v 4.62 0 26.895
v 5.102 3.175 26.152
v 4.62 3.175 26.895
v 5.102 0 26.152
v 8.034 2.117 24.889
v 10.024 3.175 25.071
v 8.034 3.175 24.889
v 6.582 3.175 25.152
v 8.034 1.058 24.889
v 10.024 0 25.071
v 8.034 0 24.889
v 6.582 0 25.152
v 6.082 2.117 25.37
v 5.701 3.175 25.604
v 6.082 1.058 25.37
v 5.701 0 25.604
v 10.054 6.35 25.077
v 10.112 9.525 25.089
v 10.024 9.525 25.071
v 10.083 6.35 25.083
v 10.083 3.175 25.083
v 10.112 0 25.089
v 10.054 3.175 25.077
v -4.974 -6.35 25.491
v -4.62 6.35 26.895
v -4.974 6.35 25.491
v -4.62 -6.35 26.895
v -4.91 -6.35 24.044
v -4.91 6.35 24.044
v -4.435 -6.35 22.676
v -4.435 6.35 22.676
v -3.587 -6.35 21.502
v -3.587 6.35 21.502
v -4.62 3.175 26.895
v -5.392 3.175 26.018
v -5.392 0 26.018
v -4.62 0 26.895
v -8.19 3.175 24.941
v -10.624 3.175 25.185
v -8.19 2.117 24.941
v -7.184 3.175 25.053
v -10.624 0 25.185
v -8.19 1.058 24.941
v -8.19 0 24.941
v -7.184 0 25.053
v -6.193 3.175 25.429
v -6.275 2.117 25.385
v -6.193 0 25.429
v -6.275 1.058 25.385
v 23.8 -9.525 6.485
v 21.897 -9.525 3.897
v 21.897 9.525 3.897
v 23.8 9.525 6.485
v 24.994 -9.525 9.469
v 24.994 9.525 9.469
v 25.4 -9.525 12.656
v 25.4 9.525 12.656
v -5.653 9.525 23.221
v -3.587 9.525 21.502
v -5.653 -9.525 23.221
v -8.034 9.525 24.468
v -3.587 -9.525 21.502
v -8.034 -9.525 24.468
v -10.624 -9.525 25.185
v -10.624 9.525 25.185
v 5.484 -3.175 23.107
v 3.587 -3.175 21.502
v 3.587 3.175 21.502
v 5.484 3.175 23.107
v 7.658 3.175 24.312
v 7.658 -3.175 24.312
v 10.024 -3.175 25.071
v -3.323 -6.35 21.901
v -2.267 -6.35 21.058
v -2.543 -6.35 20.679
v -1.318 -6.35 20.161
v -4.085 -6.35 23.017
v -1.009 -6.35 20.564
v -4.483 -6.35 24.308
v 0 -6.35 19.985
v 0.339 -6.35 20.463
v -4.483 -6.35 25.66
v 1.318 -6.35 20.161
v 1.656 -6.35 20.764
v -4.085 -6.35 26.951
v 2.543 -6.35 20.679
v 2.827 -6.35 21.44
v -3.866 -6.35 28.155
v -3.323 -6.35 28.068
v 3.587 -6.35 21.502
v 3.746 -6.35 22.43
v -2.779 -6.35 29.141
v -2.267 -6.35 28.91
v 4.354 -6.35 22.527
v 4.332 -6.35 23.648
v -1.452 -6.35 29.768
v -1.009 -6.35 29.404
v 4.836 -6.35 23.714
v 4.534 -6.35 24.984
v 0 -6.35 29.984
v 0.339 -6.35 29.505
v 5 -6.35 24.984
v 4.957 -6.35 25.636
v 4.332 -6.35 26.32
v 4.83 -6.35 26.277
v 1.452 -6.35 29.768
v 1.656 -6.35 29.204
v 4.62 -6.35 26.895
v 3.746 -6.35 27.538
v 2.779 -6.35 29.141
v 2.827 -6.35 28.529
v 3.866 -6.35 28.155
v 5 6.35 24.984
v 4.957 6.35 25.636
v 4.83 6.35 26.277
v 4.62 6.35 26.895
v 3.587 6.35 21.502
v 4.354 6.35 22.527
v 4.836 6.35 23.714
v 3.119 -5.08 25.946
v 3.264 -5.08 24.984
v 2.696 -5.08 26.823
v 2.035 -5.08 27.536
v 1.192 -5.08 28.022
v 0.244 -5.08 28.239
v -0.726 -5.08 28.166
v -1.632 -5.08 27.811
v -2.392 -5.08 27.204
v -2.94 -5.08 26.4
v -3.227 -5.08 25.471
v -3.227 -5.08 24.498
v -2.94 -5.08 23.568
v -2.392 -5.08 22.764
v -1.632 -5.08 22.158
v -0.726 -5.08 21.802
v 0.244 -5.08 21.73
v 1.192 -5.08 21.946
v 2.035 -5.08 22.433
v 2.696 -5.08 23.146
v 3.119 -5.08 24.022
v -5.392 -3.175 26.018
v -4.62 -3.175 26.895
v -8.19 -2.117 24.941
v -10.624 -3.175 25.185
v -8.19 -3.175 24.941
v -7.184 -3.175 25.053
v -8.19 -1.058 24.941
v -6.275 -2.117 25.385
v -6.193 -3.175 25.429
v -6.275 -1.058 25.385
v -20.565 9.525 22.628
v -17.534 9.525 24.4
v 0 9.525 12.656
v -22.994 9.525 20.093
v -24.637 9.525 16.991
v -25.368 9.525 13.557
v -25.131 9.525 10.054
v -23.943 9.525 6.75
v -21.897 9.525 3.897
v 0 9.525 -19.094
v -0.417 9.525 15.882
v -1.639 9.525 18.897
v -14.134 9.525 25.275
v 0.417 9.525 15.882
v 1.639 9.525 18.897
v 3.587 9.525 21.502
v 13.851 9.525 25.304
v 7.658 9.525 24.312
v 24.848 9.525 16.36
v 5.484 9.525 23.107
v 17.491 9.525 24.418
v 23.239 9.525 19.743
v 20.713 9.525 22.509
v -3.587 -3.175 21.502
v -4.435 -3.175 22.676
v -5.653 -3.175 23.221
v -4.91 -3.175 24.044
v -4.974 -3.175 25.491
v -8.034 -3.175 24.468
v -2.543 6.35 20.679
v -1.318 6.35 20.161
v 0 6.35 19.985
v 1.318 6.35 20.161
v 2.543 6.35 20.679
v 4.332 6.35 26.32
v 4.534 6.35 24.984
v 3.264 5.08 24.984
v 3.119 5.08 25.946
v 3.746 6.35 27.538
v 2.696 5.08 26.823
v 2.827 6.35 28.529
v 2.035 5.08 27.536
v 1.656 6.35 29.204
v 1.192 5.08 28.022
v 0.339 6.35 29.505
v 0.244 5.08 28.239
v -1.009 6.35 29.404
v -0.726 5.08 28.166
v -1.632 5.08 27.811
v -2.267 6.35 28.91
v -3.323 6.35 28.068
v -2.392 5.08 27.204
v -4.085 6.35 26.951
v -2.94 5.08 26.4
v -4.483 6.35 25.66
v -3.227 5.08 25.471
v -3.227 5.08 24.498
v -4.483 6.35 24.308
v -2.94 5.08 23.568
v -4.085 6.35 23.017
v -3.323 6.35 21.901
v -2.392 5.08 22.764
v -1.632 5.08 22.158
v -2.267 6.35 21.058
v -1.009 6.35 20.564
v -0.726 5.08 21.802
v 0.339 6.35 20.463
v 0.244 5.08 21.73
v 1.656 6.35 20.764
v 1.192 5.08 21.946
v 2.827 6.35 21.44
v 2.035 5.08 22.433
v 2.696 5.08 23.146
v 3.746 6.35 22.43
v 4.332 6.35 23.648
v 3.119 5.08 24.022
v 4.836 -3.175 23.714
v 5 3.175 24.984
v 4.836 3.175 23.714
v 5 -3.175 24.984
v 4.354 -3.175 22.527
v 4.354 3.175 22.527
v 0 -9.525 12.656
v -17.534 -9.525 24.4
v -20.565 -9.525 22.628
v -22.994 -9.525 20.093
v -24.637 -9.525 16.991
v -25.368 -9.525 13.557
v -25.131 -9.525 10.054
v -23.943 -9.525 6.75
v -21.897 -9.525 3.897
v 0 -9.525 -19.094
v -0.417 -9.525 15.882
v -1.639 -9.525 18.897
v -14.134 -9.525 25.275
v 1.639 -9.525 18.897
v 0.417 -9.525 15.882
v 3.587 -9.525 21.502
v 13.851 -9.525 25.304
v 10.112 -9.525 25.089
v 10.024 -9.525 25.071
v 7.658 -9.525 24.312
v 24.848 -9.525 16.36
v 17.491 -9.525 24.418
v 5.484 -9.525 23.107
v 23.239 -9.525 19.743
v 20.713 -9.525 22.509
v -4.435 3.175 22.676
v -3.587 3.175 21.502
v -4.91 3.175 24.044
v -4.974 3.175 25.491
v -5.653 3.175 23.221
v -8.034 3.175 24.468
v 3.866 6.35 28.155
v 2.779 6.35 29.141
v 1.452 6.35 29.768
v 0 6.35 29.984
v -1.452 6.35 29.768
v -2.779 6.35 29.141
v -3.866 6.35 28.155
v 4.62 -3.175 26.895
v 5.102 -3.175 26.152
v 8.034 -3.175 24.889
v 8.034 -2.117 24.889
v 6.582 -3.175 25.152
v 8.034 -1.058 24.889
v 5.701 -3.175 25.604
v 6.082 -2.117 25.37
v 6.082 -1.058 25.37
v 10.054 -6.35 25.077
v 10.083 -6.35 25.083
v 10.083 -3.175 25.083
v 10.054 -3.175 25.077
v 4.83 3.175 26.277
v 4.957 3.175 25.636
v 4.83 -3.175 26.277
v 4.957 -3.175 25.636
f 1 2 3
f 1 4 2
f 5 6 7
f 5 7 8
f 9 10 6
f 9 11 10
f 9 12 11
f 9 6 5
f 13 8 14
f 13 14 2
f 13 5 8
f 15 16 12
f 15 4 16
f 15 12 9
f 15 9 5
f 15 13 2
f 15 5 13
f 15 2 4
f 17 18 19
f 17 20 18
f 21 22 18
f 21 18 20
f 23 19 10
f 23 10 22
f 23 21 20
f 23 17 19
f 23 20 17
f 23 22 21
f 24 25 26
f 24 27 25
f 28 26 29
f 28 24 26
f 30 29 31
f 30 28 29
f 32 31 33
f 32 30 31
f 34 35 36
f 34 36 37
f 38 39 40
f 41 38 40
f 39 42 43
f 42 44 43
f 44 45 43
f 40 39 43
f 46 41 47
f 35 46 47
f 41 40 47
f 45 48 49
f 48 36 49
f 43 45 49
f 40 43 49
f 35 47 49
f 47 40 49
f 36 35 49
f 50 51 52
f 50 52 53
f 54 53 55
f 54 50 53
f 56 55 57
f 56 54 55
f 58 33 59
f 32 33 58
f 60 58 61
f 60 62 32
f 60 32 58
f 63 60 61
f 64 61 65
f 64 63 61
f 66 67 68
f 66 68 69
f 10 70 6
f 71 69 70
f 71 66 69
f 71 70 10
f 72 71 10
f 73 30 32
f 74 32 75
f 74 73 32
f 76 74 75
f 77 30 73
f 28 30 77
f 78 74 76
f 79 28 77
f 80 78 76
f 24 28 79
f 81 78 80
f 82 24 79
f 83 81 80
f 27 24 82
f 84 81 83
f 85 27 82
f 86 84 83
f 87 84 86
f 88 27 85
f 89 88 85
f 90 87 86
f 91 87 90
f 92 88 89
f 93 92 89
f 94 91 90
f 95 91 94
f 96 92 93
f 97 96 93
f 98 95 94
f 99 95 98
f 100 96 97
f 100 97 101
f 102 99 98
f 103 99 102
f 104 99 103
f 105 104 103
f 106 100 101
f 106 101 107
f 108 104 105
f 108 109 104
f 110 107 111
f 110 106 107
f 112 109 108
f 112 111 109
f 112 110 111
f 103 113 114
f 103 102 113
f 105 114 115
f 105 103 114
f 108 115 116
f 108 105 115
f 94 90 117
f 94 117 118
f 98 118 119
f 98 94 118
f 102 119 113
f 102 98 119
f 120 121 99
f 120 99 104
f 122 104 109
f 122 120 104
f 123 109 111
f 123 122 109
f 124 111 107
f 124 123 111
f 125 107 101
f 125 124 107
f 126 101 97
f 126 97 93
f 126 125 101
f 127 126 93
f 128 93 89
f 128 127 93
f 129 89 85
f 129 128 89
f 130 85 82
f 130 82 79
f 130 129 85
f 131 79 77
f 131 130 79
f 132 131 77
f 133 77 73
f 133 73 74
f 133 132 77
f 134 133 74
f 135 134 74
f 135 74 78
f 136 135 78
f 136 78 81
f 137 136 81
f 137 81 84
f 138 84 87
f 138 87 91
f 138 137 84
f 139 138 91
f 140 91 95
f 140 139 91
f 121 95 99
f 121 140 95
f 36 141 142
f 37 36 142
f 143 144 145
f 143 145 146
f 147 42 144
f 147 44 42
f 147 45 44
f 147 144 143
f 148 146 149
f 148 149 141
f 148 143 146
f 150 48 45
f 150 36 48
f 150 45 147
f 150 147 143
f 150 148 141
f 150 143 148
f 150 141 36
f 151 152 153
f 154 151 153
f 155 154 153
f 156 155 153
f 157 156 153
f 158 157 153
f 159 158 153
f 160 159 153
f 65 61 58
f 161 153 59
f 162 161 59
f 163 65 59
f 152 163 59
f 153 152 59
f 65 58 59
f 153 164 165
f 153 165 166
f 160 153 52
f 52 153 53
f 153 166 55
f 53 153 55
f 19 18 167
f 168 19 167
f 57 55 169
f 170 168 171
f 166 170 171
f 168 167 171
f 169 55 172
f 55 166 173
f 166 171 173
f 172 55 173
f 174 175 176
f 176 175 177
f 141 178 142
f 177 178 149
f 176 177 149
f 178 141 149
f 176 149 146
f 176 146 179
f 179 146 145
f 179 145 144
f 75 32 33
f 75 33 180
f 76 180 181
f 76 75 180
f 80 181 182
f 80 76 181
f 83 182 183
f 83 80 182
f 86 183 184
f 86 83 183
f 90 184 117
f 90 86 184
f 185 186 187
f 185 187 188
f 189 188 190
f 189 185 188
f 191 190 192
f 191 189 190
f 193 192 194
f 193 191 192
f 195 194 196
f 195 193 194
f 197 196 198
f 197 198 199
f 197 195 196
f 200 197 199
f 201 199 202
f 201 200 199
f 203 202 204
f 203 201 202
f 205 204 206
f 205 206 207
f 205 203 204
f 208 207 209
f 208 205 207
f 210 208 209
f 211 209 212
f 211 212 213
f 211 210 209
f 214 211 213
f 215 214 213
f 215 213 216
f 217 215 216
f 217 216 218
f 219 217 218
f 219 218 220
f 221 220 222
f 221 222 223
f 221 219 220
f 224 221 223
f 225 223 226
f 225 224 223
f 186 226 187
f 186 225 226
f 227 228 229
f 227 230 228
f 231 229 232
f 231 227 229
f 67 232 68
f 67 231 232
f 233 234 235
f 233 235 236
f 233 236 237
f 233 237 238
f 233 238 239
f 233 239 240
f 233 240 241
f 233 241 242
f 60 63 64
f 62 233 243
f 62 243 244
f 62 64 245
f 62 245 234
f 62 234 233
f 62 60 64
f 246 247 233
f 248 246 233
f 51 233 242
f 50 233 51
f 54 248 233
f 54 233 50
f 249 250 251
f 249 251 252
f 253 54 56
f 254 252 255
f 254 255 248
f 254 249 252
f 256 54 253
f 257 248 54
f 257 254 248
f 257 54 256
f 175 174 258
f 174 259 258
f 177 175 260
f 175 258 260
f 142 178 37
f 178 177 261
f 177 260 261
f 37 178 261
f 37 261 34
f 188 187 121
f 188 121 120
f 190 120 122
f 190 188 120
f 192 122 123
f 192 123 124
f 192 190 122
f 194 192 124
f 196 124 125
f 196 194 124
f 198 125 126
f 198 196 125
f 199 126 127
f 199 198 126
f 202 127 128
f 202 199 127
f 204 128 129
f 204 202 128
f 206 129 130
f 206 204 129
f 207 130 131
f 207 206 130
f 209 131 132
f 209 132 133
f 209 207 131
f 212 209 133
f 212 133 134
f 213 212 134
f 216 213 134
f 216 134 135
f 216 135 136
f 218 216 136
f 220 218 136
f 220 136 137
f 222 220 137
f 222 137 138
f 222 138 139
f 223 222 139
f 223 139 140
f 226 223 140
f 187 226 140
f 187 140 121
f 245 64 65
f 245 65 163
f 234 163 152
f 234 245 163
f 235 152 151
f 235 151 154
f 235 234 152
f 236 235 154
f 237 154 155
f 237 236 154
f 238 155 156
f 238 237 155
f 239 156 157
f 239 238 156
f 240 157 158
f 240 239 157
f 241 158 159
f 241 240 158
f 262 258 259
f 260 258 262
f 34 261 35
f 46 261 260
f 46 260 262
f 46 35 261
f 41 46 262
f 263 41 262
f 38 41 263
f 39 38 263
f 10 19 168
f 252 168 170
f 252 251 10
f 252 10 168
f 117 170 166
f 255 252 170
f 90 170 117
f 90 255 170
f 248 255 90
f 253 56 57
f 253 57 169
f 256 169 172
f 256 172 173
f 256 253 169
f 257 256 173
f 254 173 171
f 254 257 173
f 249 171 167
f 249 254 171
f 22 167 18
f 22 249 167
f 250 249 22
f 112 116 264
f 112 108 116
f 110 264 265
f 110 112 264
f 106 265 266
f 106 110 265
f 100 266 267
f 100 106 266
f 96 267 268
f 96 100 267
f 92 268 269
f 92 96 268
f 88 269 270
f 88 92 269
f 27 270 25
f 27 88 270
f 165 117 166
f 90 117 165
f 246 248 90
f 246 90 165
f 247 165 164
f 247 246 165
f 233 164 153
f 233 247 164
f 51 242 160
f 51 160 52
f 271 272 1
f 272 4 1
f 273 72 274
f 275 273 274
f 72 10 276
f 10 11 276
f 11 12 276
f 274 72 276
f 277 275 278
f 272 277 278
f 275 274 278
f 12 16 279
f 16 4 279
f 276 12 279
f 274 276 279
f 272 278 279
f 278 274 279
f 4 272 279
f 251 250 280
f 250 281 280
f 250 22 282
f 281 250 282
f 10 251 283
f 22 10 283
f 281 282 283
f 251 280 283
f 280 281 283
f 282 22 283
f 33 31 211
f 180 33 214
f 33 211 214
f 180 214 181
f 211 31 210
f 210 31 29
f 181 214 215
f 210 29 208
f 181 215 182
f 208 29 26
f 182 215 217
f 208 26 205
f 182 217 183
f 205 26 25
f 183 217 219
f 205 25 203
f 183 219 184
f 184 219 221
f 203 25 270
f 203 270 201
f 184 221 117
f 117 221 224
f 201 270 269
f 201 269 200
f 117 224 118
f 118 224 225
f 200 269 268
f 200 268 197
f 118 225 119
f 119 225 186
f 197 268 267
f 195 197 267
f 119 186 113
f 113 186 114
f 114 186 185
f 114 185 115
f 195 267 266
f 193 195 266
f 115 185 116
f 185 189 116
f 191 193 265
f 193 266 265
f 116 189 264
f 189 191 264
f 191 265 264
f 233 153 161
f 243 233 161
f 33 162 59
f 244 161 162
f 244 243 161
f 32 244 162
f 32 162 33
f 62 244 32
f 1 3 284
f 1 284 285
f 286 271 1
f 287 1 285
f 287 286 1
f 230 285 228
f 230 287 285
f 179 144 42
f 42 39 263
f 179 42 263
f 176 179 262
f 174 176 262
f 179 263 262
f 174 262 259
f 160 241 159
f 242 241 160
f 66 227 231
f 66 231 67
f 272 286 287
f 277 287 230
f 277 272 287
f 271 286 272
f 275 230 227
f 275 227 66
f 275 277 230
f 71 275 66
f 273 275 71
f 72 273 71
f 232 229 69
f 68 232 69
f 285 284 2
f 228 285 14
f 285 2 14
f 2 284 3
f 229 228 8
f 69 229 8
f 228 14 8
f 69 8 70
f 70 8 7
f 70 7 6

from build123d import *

# Parameters (mm, degrees)
F1_DEPTH = 9.525
F0_R     = 3.263573
F2_DEPTH = 6.35
F3_DEPTH = 3.175
F4_SIZE  = 1.27


with BuildPart() as f1:
    # F0 (on Front) → F1 (new body, symmetric)
    with BuildSketch(Plane.XZ):
        with BuildLine():
            ThreePointArc((3.587389, 21.501787), (0.930969, 17.428697), (0, 12.655866))
            ThreePointArc((0, 12.655866), (7.983338, 0.864212), (21.896552, 3.897245))
            ThreePointArc((21.896552, 3.897245), (24.491654, 7.939205), (25.4, 12.655866))
            ThreePointArc((25.4, 12.655866), (20.713209, 22.508707), (10.11205, 25.08939))
            add(Edge.make_bspline(
                [(10.11205, 25.08939), (10.082931, 25.083087), (10.053647, 25.076882), (10.024208, 25.070782)],
                knots=[0, 0, 0, 0, 0.090159, 0.090159, 0.090159, 0.090159], degree=3))
            ThreePointArc((10.024208, 25.070782), (6.541588, 23.762799), (3.587389, 21.501787))
        make_face()
        with BuildLine():
            ThreePointArc((-3.587389, 21.501787), (-6.810536, 23.90772), (-10.624388, 25.185105))
            ThreePointArc((-10.624388, 25.185105), (-23.923644, 18.598913), (-21.896552, 3.897245))
            ThreePointArc((-21.896552, 3.897245), (-7.983338, 0.864212), (0, 12.655866))
            ThreePointArc((0, 12.655866), (-0.930969, 17.428697), (-3.587389, 21.501787))
        make_face()
        with BuildLine():
            ThreePointArc((0, 12.655866), (-7.983338, 0.864212), (-21.896552, 3.897245))
            Line((-21.896552, 3.897245), (0, -19.094134))
            Line((0, -19.094134), (21.896552, 3.897245))
            ThreePointArc((21.896552, 3.897245), (7.983338, 0.864212), (0, 12.655866))
        make_face()
    extrude(amount=F1_DEPTH, both=True)

    # F0 (on Front) → F2 (join, symmetric)
    with BuildSketch(Plane.XZ):
        with BuildLine():
            ThreePointArc((-4.619993, 26.895242), (-4.91046, 24.044055), (-3.587389, 21.501787))
            ThreePointArc((-3.587389, 21.501787), (0, 19.98454), (3.587389, 21.501787))
            ThreePointArc((3.587389, 21.501787), (4.633149, 23.105252), (4.999646, 24.984187))
            ThreePointArc((4.999646, 24.984187), (4.903815, 25.958388), (4.619993, 26.895242))
            ThreePointArc((4.619993, 26.895242), (0, 29.983833), (-4.619993, 26.895242))
        make_face()
        with Locations((0, 24.984187)):
            Circle(F0_R, mode=Mode.SUBTRACT)
    extrude(amount=F2_DEPTH, both=True)

    # F4
    f4_edges = [f1.edges().sort_by_distance(p)[0] for p in [
        (-3.263573, -6.35, 24.984187),
        (-3.263573, 6.35, 24.984187),
    ]]
    chamfer(f4_edges, length=F4_SIZE)


with BuildPart() as f3:
    # F0 (on Front) → F3 (new body, symmetric)
    with BuildSketch(Plane.XZ):
        with BuildLine():
            add(Edge.make_bspline(
                [(-10.624388, 25.185105), (-7.844404, 24.724569), (-6.230196, 24.724569), (-4.619993, 26.895242)],
                knots=[0, 0, 0, 0, 6.243183, 6.243183, 6.243183, 6.243183], degree=3))
            ThreePointArc((-10.624388, 25.185105), (-6.810536, 23.90772), (-3.587389, 21.501787))
            ThreePointArc((-3.587389, 21.501787), (-4.91046, 24.044055), (-4.619993, 26.895242))
        make_face()
        with BuildLine():
            ThreePointArc((4.999646, 24.984187), (4.633149, 23.105252), (3.587389, 21.501787))
            ThreePointArc((3.587389, 21.501787), (6.541588, 23.762799), (10.024208, 25.070782))
            add(Edge.make_bspline(
                [(10.024208, 25.070782), (8.16588, 24.685738), (5.686702, 24.719665), (4.619993, 26.895242)],
                knots=[0.090159, 0.090159, 0.090159, 0.090159, 5.781332, 5.781332, 5.781332, 5.781332], degree=3))
            ThreePointArc((4.619993, 26.895242), (4.903815, 25.958388), (4.999646, 24.984187))
        make_face()
    extrude(amount=F3_DEPTH, both=True)


solid = Compound([f1.part, f3.part])
